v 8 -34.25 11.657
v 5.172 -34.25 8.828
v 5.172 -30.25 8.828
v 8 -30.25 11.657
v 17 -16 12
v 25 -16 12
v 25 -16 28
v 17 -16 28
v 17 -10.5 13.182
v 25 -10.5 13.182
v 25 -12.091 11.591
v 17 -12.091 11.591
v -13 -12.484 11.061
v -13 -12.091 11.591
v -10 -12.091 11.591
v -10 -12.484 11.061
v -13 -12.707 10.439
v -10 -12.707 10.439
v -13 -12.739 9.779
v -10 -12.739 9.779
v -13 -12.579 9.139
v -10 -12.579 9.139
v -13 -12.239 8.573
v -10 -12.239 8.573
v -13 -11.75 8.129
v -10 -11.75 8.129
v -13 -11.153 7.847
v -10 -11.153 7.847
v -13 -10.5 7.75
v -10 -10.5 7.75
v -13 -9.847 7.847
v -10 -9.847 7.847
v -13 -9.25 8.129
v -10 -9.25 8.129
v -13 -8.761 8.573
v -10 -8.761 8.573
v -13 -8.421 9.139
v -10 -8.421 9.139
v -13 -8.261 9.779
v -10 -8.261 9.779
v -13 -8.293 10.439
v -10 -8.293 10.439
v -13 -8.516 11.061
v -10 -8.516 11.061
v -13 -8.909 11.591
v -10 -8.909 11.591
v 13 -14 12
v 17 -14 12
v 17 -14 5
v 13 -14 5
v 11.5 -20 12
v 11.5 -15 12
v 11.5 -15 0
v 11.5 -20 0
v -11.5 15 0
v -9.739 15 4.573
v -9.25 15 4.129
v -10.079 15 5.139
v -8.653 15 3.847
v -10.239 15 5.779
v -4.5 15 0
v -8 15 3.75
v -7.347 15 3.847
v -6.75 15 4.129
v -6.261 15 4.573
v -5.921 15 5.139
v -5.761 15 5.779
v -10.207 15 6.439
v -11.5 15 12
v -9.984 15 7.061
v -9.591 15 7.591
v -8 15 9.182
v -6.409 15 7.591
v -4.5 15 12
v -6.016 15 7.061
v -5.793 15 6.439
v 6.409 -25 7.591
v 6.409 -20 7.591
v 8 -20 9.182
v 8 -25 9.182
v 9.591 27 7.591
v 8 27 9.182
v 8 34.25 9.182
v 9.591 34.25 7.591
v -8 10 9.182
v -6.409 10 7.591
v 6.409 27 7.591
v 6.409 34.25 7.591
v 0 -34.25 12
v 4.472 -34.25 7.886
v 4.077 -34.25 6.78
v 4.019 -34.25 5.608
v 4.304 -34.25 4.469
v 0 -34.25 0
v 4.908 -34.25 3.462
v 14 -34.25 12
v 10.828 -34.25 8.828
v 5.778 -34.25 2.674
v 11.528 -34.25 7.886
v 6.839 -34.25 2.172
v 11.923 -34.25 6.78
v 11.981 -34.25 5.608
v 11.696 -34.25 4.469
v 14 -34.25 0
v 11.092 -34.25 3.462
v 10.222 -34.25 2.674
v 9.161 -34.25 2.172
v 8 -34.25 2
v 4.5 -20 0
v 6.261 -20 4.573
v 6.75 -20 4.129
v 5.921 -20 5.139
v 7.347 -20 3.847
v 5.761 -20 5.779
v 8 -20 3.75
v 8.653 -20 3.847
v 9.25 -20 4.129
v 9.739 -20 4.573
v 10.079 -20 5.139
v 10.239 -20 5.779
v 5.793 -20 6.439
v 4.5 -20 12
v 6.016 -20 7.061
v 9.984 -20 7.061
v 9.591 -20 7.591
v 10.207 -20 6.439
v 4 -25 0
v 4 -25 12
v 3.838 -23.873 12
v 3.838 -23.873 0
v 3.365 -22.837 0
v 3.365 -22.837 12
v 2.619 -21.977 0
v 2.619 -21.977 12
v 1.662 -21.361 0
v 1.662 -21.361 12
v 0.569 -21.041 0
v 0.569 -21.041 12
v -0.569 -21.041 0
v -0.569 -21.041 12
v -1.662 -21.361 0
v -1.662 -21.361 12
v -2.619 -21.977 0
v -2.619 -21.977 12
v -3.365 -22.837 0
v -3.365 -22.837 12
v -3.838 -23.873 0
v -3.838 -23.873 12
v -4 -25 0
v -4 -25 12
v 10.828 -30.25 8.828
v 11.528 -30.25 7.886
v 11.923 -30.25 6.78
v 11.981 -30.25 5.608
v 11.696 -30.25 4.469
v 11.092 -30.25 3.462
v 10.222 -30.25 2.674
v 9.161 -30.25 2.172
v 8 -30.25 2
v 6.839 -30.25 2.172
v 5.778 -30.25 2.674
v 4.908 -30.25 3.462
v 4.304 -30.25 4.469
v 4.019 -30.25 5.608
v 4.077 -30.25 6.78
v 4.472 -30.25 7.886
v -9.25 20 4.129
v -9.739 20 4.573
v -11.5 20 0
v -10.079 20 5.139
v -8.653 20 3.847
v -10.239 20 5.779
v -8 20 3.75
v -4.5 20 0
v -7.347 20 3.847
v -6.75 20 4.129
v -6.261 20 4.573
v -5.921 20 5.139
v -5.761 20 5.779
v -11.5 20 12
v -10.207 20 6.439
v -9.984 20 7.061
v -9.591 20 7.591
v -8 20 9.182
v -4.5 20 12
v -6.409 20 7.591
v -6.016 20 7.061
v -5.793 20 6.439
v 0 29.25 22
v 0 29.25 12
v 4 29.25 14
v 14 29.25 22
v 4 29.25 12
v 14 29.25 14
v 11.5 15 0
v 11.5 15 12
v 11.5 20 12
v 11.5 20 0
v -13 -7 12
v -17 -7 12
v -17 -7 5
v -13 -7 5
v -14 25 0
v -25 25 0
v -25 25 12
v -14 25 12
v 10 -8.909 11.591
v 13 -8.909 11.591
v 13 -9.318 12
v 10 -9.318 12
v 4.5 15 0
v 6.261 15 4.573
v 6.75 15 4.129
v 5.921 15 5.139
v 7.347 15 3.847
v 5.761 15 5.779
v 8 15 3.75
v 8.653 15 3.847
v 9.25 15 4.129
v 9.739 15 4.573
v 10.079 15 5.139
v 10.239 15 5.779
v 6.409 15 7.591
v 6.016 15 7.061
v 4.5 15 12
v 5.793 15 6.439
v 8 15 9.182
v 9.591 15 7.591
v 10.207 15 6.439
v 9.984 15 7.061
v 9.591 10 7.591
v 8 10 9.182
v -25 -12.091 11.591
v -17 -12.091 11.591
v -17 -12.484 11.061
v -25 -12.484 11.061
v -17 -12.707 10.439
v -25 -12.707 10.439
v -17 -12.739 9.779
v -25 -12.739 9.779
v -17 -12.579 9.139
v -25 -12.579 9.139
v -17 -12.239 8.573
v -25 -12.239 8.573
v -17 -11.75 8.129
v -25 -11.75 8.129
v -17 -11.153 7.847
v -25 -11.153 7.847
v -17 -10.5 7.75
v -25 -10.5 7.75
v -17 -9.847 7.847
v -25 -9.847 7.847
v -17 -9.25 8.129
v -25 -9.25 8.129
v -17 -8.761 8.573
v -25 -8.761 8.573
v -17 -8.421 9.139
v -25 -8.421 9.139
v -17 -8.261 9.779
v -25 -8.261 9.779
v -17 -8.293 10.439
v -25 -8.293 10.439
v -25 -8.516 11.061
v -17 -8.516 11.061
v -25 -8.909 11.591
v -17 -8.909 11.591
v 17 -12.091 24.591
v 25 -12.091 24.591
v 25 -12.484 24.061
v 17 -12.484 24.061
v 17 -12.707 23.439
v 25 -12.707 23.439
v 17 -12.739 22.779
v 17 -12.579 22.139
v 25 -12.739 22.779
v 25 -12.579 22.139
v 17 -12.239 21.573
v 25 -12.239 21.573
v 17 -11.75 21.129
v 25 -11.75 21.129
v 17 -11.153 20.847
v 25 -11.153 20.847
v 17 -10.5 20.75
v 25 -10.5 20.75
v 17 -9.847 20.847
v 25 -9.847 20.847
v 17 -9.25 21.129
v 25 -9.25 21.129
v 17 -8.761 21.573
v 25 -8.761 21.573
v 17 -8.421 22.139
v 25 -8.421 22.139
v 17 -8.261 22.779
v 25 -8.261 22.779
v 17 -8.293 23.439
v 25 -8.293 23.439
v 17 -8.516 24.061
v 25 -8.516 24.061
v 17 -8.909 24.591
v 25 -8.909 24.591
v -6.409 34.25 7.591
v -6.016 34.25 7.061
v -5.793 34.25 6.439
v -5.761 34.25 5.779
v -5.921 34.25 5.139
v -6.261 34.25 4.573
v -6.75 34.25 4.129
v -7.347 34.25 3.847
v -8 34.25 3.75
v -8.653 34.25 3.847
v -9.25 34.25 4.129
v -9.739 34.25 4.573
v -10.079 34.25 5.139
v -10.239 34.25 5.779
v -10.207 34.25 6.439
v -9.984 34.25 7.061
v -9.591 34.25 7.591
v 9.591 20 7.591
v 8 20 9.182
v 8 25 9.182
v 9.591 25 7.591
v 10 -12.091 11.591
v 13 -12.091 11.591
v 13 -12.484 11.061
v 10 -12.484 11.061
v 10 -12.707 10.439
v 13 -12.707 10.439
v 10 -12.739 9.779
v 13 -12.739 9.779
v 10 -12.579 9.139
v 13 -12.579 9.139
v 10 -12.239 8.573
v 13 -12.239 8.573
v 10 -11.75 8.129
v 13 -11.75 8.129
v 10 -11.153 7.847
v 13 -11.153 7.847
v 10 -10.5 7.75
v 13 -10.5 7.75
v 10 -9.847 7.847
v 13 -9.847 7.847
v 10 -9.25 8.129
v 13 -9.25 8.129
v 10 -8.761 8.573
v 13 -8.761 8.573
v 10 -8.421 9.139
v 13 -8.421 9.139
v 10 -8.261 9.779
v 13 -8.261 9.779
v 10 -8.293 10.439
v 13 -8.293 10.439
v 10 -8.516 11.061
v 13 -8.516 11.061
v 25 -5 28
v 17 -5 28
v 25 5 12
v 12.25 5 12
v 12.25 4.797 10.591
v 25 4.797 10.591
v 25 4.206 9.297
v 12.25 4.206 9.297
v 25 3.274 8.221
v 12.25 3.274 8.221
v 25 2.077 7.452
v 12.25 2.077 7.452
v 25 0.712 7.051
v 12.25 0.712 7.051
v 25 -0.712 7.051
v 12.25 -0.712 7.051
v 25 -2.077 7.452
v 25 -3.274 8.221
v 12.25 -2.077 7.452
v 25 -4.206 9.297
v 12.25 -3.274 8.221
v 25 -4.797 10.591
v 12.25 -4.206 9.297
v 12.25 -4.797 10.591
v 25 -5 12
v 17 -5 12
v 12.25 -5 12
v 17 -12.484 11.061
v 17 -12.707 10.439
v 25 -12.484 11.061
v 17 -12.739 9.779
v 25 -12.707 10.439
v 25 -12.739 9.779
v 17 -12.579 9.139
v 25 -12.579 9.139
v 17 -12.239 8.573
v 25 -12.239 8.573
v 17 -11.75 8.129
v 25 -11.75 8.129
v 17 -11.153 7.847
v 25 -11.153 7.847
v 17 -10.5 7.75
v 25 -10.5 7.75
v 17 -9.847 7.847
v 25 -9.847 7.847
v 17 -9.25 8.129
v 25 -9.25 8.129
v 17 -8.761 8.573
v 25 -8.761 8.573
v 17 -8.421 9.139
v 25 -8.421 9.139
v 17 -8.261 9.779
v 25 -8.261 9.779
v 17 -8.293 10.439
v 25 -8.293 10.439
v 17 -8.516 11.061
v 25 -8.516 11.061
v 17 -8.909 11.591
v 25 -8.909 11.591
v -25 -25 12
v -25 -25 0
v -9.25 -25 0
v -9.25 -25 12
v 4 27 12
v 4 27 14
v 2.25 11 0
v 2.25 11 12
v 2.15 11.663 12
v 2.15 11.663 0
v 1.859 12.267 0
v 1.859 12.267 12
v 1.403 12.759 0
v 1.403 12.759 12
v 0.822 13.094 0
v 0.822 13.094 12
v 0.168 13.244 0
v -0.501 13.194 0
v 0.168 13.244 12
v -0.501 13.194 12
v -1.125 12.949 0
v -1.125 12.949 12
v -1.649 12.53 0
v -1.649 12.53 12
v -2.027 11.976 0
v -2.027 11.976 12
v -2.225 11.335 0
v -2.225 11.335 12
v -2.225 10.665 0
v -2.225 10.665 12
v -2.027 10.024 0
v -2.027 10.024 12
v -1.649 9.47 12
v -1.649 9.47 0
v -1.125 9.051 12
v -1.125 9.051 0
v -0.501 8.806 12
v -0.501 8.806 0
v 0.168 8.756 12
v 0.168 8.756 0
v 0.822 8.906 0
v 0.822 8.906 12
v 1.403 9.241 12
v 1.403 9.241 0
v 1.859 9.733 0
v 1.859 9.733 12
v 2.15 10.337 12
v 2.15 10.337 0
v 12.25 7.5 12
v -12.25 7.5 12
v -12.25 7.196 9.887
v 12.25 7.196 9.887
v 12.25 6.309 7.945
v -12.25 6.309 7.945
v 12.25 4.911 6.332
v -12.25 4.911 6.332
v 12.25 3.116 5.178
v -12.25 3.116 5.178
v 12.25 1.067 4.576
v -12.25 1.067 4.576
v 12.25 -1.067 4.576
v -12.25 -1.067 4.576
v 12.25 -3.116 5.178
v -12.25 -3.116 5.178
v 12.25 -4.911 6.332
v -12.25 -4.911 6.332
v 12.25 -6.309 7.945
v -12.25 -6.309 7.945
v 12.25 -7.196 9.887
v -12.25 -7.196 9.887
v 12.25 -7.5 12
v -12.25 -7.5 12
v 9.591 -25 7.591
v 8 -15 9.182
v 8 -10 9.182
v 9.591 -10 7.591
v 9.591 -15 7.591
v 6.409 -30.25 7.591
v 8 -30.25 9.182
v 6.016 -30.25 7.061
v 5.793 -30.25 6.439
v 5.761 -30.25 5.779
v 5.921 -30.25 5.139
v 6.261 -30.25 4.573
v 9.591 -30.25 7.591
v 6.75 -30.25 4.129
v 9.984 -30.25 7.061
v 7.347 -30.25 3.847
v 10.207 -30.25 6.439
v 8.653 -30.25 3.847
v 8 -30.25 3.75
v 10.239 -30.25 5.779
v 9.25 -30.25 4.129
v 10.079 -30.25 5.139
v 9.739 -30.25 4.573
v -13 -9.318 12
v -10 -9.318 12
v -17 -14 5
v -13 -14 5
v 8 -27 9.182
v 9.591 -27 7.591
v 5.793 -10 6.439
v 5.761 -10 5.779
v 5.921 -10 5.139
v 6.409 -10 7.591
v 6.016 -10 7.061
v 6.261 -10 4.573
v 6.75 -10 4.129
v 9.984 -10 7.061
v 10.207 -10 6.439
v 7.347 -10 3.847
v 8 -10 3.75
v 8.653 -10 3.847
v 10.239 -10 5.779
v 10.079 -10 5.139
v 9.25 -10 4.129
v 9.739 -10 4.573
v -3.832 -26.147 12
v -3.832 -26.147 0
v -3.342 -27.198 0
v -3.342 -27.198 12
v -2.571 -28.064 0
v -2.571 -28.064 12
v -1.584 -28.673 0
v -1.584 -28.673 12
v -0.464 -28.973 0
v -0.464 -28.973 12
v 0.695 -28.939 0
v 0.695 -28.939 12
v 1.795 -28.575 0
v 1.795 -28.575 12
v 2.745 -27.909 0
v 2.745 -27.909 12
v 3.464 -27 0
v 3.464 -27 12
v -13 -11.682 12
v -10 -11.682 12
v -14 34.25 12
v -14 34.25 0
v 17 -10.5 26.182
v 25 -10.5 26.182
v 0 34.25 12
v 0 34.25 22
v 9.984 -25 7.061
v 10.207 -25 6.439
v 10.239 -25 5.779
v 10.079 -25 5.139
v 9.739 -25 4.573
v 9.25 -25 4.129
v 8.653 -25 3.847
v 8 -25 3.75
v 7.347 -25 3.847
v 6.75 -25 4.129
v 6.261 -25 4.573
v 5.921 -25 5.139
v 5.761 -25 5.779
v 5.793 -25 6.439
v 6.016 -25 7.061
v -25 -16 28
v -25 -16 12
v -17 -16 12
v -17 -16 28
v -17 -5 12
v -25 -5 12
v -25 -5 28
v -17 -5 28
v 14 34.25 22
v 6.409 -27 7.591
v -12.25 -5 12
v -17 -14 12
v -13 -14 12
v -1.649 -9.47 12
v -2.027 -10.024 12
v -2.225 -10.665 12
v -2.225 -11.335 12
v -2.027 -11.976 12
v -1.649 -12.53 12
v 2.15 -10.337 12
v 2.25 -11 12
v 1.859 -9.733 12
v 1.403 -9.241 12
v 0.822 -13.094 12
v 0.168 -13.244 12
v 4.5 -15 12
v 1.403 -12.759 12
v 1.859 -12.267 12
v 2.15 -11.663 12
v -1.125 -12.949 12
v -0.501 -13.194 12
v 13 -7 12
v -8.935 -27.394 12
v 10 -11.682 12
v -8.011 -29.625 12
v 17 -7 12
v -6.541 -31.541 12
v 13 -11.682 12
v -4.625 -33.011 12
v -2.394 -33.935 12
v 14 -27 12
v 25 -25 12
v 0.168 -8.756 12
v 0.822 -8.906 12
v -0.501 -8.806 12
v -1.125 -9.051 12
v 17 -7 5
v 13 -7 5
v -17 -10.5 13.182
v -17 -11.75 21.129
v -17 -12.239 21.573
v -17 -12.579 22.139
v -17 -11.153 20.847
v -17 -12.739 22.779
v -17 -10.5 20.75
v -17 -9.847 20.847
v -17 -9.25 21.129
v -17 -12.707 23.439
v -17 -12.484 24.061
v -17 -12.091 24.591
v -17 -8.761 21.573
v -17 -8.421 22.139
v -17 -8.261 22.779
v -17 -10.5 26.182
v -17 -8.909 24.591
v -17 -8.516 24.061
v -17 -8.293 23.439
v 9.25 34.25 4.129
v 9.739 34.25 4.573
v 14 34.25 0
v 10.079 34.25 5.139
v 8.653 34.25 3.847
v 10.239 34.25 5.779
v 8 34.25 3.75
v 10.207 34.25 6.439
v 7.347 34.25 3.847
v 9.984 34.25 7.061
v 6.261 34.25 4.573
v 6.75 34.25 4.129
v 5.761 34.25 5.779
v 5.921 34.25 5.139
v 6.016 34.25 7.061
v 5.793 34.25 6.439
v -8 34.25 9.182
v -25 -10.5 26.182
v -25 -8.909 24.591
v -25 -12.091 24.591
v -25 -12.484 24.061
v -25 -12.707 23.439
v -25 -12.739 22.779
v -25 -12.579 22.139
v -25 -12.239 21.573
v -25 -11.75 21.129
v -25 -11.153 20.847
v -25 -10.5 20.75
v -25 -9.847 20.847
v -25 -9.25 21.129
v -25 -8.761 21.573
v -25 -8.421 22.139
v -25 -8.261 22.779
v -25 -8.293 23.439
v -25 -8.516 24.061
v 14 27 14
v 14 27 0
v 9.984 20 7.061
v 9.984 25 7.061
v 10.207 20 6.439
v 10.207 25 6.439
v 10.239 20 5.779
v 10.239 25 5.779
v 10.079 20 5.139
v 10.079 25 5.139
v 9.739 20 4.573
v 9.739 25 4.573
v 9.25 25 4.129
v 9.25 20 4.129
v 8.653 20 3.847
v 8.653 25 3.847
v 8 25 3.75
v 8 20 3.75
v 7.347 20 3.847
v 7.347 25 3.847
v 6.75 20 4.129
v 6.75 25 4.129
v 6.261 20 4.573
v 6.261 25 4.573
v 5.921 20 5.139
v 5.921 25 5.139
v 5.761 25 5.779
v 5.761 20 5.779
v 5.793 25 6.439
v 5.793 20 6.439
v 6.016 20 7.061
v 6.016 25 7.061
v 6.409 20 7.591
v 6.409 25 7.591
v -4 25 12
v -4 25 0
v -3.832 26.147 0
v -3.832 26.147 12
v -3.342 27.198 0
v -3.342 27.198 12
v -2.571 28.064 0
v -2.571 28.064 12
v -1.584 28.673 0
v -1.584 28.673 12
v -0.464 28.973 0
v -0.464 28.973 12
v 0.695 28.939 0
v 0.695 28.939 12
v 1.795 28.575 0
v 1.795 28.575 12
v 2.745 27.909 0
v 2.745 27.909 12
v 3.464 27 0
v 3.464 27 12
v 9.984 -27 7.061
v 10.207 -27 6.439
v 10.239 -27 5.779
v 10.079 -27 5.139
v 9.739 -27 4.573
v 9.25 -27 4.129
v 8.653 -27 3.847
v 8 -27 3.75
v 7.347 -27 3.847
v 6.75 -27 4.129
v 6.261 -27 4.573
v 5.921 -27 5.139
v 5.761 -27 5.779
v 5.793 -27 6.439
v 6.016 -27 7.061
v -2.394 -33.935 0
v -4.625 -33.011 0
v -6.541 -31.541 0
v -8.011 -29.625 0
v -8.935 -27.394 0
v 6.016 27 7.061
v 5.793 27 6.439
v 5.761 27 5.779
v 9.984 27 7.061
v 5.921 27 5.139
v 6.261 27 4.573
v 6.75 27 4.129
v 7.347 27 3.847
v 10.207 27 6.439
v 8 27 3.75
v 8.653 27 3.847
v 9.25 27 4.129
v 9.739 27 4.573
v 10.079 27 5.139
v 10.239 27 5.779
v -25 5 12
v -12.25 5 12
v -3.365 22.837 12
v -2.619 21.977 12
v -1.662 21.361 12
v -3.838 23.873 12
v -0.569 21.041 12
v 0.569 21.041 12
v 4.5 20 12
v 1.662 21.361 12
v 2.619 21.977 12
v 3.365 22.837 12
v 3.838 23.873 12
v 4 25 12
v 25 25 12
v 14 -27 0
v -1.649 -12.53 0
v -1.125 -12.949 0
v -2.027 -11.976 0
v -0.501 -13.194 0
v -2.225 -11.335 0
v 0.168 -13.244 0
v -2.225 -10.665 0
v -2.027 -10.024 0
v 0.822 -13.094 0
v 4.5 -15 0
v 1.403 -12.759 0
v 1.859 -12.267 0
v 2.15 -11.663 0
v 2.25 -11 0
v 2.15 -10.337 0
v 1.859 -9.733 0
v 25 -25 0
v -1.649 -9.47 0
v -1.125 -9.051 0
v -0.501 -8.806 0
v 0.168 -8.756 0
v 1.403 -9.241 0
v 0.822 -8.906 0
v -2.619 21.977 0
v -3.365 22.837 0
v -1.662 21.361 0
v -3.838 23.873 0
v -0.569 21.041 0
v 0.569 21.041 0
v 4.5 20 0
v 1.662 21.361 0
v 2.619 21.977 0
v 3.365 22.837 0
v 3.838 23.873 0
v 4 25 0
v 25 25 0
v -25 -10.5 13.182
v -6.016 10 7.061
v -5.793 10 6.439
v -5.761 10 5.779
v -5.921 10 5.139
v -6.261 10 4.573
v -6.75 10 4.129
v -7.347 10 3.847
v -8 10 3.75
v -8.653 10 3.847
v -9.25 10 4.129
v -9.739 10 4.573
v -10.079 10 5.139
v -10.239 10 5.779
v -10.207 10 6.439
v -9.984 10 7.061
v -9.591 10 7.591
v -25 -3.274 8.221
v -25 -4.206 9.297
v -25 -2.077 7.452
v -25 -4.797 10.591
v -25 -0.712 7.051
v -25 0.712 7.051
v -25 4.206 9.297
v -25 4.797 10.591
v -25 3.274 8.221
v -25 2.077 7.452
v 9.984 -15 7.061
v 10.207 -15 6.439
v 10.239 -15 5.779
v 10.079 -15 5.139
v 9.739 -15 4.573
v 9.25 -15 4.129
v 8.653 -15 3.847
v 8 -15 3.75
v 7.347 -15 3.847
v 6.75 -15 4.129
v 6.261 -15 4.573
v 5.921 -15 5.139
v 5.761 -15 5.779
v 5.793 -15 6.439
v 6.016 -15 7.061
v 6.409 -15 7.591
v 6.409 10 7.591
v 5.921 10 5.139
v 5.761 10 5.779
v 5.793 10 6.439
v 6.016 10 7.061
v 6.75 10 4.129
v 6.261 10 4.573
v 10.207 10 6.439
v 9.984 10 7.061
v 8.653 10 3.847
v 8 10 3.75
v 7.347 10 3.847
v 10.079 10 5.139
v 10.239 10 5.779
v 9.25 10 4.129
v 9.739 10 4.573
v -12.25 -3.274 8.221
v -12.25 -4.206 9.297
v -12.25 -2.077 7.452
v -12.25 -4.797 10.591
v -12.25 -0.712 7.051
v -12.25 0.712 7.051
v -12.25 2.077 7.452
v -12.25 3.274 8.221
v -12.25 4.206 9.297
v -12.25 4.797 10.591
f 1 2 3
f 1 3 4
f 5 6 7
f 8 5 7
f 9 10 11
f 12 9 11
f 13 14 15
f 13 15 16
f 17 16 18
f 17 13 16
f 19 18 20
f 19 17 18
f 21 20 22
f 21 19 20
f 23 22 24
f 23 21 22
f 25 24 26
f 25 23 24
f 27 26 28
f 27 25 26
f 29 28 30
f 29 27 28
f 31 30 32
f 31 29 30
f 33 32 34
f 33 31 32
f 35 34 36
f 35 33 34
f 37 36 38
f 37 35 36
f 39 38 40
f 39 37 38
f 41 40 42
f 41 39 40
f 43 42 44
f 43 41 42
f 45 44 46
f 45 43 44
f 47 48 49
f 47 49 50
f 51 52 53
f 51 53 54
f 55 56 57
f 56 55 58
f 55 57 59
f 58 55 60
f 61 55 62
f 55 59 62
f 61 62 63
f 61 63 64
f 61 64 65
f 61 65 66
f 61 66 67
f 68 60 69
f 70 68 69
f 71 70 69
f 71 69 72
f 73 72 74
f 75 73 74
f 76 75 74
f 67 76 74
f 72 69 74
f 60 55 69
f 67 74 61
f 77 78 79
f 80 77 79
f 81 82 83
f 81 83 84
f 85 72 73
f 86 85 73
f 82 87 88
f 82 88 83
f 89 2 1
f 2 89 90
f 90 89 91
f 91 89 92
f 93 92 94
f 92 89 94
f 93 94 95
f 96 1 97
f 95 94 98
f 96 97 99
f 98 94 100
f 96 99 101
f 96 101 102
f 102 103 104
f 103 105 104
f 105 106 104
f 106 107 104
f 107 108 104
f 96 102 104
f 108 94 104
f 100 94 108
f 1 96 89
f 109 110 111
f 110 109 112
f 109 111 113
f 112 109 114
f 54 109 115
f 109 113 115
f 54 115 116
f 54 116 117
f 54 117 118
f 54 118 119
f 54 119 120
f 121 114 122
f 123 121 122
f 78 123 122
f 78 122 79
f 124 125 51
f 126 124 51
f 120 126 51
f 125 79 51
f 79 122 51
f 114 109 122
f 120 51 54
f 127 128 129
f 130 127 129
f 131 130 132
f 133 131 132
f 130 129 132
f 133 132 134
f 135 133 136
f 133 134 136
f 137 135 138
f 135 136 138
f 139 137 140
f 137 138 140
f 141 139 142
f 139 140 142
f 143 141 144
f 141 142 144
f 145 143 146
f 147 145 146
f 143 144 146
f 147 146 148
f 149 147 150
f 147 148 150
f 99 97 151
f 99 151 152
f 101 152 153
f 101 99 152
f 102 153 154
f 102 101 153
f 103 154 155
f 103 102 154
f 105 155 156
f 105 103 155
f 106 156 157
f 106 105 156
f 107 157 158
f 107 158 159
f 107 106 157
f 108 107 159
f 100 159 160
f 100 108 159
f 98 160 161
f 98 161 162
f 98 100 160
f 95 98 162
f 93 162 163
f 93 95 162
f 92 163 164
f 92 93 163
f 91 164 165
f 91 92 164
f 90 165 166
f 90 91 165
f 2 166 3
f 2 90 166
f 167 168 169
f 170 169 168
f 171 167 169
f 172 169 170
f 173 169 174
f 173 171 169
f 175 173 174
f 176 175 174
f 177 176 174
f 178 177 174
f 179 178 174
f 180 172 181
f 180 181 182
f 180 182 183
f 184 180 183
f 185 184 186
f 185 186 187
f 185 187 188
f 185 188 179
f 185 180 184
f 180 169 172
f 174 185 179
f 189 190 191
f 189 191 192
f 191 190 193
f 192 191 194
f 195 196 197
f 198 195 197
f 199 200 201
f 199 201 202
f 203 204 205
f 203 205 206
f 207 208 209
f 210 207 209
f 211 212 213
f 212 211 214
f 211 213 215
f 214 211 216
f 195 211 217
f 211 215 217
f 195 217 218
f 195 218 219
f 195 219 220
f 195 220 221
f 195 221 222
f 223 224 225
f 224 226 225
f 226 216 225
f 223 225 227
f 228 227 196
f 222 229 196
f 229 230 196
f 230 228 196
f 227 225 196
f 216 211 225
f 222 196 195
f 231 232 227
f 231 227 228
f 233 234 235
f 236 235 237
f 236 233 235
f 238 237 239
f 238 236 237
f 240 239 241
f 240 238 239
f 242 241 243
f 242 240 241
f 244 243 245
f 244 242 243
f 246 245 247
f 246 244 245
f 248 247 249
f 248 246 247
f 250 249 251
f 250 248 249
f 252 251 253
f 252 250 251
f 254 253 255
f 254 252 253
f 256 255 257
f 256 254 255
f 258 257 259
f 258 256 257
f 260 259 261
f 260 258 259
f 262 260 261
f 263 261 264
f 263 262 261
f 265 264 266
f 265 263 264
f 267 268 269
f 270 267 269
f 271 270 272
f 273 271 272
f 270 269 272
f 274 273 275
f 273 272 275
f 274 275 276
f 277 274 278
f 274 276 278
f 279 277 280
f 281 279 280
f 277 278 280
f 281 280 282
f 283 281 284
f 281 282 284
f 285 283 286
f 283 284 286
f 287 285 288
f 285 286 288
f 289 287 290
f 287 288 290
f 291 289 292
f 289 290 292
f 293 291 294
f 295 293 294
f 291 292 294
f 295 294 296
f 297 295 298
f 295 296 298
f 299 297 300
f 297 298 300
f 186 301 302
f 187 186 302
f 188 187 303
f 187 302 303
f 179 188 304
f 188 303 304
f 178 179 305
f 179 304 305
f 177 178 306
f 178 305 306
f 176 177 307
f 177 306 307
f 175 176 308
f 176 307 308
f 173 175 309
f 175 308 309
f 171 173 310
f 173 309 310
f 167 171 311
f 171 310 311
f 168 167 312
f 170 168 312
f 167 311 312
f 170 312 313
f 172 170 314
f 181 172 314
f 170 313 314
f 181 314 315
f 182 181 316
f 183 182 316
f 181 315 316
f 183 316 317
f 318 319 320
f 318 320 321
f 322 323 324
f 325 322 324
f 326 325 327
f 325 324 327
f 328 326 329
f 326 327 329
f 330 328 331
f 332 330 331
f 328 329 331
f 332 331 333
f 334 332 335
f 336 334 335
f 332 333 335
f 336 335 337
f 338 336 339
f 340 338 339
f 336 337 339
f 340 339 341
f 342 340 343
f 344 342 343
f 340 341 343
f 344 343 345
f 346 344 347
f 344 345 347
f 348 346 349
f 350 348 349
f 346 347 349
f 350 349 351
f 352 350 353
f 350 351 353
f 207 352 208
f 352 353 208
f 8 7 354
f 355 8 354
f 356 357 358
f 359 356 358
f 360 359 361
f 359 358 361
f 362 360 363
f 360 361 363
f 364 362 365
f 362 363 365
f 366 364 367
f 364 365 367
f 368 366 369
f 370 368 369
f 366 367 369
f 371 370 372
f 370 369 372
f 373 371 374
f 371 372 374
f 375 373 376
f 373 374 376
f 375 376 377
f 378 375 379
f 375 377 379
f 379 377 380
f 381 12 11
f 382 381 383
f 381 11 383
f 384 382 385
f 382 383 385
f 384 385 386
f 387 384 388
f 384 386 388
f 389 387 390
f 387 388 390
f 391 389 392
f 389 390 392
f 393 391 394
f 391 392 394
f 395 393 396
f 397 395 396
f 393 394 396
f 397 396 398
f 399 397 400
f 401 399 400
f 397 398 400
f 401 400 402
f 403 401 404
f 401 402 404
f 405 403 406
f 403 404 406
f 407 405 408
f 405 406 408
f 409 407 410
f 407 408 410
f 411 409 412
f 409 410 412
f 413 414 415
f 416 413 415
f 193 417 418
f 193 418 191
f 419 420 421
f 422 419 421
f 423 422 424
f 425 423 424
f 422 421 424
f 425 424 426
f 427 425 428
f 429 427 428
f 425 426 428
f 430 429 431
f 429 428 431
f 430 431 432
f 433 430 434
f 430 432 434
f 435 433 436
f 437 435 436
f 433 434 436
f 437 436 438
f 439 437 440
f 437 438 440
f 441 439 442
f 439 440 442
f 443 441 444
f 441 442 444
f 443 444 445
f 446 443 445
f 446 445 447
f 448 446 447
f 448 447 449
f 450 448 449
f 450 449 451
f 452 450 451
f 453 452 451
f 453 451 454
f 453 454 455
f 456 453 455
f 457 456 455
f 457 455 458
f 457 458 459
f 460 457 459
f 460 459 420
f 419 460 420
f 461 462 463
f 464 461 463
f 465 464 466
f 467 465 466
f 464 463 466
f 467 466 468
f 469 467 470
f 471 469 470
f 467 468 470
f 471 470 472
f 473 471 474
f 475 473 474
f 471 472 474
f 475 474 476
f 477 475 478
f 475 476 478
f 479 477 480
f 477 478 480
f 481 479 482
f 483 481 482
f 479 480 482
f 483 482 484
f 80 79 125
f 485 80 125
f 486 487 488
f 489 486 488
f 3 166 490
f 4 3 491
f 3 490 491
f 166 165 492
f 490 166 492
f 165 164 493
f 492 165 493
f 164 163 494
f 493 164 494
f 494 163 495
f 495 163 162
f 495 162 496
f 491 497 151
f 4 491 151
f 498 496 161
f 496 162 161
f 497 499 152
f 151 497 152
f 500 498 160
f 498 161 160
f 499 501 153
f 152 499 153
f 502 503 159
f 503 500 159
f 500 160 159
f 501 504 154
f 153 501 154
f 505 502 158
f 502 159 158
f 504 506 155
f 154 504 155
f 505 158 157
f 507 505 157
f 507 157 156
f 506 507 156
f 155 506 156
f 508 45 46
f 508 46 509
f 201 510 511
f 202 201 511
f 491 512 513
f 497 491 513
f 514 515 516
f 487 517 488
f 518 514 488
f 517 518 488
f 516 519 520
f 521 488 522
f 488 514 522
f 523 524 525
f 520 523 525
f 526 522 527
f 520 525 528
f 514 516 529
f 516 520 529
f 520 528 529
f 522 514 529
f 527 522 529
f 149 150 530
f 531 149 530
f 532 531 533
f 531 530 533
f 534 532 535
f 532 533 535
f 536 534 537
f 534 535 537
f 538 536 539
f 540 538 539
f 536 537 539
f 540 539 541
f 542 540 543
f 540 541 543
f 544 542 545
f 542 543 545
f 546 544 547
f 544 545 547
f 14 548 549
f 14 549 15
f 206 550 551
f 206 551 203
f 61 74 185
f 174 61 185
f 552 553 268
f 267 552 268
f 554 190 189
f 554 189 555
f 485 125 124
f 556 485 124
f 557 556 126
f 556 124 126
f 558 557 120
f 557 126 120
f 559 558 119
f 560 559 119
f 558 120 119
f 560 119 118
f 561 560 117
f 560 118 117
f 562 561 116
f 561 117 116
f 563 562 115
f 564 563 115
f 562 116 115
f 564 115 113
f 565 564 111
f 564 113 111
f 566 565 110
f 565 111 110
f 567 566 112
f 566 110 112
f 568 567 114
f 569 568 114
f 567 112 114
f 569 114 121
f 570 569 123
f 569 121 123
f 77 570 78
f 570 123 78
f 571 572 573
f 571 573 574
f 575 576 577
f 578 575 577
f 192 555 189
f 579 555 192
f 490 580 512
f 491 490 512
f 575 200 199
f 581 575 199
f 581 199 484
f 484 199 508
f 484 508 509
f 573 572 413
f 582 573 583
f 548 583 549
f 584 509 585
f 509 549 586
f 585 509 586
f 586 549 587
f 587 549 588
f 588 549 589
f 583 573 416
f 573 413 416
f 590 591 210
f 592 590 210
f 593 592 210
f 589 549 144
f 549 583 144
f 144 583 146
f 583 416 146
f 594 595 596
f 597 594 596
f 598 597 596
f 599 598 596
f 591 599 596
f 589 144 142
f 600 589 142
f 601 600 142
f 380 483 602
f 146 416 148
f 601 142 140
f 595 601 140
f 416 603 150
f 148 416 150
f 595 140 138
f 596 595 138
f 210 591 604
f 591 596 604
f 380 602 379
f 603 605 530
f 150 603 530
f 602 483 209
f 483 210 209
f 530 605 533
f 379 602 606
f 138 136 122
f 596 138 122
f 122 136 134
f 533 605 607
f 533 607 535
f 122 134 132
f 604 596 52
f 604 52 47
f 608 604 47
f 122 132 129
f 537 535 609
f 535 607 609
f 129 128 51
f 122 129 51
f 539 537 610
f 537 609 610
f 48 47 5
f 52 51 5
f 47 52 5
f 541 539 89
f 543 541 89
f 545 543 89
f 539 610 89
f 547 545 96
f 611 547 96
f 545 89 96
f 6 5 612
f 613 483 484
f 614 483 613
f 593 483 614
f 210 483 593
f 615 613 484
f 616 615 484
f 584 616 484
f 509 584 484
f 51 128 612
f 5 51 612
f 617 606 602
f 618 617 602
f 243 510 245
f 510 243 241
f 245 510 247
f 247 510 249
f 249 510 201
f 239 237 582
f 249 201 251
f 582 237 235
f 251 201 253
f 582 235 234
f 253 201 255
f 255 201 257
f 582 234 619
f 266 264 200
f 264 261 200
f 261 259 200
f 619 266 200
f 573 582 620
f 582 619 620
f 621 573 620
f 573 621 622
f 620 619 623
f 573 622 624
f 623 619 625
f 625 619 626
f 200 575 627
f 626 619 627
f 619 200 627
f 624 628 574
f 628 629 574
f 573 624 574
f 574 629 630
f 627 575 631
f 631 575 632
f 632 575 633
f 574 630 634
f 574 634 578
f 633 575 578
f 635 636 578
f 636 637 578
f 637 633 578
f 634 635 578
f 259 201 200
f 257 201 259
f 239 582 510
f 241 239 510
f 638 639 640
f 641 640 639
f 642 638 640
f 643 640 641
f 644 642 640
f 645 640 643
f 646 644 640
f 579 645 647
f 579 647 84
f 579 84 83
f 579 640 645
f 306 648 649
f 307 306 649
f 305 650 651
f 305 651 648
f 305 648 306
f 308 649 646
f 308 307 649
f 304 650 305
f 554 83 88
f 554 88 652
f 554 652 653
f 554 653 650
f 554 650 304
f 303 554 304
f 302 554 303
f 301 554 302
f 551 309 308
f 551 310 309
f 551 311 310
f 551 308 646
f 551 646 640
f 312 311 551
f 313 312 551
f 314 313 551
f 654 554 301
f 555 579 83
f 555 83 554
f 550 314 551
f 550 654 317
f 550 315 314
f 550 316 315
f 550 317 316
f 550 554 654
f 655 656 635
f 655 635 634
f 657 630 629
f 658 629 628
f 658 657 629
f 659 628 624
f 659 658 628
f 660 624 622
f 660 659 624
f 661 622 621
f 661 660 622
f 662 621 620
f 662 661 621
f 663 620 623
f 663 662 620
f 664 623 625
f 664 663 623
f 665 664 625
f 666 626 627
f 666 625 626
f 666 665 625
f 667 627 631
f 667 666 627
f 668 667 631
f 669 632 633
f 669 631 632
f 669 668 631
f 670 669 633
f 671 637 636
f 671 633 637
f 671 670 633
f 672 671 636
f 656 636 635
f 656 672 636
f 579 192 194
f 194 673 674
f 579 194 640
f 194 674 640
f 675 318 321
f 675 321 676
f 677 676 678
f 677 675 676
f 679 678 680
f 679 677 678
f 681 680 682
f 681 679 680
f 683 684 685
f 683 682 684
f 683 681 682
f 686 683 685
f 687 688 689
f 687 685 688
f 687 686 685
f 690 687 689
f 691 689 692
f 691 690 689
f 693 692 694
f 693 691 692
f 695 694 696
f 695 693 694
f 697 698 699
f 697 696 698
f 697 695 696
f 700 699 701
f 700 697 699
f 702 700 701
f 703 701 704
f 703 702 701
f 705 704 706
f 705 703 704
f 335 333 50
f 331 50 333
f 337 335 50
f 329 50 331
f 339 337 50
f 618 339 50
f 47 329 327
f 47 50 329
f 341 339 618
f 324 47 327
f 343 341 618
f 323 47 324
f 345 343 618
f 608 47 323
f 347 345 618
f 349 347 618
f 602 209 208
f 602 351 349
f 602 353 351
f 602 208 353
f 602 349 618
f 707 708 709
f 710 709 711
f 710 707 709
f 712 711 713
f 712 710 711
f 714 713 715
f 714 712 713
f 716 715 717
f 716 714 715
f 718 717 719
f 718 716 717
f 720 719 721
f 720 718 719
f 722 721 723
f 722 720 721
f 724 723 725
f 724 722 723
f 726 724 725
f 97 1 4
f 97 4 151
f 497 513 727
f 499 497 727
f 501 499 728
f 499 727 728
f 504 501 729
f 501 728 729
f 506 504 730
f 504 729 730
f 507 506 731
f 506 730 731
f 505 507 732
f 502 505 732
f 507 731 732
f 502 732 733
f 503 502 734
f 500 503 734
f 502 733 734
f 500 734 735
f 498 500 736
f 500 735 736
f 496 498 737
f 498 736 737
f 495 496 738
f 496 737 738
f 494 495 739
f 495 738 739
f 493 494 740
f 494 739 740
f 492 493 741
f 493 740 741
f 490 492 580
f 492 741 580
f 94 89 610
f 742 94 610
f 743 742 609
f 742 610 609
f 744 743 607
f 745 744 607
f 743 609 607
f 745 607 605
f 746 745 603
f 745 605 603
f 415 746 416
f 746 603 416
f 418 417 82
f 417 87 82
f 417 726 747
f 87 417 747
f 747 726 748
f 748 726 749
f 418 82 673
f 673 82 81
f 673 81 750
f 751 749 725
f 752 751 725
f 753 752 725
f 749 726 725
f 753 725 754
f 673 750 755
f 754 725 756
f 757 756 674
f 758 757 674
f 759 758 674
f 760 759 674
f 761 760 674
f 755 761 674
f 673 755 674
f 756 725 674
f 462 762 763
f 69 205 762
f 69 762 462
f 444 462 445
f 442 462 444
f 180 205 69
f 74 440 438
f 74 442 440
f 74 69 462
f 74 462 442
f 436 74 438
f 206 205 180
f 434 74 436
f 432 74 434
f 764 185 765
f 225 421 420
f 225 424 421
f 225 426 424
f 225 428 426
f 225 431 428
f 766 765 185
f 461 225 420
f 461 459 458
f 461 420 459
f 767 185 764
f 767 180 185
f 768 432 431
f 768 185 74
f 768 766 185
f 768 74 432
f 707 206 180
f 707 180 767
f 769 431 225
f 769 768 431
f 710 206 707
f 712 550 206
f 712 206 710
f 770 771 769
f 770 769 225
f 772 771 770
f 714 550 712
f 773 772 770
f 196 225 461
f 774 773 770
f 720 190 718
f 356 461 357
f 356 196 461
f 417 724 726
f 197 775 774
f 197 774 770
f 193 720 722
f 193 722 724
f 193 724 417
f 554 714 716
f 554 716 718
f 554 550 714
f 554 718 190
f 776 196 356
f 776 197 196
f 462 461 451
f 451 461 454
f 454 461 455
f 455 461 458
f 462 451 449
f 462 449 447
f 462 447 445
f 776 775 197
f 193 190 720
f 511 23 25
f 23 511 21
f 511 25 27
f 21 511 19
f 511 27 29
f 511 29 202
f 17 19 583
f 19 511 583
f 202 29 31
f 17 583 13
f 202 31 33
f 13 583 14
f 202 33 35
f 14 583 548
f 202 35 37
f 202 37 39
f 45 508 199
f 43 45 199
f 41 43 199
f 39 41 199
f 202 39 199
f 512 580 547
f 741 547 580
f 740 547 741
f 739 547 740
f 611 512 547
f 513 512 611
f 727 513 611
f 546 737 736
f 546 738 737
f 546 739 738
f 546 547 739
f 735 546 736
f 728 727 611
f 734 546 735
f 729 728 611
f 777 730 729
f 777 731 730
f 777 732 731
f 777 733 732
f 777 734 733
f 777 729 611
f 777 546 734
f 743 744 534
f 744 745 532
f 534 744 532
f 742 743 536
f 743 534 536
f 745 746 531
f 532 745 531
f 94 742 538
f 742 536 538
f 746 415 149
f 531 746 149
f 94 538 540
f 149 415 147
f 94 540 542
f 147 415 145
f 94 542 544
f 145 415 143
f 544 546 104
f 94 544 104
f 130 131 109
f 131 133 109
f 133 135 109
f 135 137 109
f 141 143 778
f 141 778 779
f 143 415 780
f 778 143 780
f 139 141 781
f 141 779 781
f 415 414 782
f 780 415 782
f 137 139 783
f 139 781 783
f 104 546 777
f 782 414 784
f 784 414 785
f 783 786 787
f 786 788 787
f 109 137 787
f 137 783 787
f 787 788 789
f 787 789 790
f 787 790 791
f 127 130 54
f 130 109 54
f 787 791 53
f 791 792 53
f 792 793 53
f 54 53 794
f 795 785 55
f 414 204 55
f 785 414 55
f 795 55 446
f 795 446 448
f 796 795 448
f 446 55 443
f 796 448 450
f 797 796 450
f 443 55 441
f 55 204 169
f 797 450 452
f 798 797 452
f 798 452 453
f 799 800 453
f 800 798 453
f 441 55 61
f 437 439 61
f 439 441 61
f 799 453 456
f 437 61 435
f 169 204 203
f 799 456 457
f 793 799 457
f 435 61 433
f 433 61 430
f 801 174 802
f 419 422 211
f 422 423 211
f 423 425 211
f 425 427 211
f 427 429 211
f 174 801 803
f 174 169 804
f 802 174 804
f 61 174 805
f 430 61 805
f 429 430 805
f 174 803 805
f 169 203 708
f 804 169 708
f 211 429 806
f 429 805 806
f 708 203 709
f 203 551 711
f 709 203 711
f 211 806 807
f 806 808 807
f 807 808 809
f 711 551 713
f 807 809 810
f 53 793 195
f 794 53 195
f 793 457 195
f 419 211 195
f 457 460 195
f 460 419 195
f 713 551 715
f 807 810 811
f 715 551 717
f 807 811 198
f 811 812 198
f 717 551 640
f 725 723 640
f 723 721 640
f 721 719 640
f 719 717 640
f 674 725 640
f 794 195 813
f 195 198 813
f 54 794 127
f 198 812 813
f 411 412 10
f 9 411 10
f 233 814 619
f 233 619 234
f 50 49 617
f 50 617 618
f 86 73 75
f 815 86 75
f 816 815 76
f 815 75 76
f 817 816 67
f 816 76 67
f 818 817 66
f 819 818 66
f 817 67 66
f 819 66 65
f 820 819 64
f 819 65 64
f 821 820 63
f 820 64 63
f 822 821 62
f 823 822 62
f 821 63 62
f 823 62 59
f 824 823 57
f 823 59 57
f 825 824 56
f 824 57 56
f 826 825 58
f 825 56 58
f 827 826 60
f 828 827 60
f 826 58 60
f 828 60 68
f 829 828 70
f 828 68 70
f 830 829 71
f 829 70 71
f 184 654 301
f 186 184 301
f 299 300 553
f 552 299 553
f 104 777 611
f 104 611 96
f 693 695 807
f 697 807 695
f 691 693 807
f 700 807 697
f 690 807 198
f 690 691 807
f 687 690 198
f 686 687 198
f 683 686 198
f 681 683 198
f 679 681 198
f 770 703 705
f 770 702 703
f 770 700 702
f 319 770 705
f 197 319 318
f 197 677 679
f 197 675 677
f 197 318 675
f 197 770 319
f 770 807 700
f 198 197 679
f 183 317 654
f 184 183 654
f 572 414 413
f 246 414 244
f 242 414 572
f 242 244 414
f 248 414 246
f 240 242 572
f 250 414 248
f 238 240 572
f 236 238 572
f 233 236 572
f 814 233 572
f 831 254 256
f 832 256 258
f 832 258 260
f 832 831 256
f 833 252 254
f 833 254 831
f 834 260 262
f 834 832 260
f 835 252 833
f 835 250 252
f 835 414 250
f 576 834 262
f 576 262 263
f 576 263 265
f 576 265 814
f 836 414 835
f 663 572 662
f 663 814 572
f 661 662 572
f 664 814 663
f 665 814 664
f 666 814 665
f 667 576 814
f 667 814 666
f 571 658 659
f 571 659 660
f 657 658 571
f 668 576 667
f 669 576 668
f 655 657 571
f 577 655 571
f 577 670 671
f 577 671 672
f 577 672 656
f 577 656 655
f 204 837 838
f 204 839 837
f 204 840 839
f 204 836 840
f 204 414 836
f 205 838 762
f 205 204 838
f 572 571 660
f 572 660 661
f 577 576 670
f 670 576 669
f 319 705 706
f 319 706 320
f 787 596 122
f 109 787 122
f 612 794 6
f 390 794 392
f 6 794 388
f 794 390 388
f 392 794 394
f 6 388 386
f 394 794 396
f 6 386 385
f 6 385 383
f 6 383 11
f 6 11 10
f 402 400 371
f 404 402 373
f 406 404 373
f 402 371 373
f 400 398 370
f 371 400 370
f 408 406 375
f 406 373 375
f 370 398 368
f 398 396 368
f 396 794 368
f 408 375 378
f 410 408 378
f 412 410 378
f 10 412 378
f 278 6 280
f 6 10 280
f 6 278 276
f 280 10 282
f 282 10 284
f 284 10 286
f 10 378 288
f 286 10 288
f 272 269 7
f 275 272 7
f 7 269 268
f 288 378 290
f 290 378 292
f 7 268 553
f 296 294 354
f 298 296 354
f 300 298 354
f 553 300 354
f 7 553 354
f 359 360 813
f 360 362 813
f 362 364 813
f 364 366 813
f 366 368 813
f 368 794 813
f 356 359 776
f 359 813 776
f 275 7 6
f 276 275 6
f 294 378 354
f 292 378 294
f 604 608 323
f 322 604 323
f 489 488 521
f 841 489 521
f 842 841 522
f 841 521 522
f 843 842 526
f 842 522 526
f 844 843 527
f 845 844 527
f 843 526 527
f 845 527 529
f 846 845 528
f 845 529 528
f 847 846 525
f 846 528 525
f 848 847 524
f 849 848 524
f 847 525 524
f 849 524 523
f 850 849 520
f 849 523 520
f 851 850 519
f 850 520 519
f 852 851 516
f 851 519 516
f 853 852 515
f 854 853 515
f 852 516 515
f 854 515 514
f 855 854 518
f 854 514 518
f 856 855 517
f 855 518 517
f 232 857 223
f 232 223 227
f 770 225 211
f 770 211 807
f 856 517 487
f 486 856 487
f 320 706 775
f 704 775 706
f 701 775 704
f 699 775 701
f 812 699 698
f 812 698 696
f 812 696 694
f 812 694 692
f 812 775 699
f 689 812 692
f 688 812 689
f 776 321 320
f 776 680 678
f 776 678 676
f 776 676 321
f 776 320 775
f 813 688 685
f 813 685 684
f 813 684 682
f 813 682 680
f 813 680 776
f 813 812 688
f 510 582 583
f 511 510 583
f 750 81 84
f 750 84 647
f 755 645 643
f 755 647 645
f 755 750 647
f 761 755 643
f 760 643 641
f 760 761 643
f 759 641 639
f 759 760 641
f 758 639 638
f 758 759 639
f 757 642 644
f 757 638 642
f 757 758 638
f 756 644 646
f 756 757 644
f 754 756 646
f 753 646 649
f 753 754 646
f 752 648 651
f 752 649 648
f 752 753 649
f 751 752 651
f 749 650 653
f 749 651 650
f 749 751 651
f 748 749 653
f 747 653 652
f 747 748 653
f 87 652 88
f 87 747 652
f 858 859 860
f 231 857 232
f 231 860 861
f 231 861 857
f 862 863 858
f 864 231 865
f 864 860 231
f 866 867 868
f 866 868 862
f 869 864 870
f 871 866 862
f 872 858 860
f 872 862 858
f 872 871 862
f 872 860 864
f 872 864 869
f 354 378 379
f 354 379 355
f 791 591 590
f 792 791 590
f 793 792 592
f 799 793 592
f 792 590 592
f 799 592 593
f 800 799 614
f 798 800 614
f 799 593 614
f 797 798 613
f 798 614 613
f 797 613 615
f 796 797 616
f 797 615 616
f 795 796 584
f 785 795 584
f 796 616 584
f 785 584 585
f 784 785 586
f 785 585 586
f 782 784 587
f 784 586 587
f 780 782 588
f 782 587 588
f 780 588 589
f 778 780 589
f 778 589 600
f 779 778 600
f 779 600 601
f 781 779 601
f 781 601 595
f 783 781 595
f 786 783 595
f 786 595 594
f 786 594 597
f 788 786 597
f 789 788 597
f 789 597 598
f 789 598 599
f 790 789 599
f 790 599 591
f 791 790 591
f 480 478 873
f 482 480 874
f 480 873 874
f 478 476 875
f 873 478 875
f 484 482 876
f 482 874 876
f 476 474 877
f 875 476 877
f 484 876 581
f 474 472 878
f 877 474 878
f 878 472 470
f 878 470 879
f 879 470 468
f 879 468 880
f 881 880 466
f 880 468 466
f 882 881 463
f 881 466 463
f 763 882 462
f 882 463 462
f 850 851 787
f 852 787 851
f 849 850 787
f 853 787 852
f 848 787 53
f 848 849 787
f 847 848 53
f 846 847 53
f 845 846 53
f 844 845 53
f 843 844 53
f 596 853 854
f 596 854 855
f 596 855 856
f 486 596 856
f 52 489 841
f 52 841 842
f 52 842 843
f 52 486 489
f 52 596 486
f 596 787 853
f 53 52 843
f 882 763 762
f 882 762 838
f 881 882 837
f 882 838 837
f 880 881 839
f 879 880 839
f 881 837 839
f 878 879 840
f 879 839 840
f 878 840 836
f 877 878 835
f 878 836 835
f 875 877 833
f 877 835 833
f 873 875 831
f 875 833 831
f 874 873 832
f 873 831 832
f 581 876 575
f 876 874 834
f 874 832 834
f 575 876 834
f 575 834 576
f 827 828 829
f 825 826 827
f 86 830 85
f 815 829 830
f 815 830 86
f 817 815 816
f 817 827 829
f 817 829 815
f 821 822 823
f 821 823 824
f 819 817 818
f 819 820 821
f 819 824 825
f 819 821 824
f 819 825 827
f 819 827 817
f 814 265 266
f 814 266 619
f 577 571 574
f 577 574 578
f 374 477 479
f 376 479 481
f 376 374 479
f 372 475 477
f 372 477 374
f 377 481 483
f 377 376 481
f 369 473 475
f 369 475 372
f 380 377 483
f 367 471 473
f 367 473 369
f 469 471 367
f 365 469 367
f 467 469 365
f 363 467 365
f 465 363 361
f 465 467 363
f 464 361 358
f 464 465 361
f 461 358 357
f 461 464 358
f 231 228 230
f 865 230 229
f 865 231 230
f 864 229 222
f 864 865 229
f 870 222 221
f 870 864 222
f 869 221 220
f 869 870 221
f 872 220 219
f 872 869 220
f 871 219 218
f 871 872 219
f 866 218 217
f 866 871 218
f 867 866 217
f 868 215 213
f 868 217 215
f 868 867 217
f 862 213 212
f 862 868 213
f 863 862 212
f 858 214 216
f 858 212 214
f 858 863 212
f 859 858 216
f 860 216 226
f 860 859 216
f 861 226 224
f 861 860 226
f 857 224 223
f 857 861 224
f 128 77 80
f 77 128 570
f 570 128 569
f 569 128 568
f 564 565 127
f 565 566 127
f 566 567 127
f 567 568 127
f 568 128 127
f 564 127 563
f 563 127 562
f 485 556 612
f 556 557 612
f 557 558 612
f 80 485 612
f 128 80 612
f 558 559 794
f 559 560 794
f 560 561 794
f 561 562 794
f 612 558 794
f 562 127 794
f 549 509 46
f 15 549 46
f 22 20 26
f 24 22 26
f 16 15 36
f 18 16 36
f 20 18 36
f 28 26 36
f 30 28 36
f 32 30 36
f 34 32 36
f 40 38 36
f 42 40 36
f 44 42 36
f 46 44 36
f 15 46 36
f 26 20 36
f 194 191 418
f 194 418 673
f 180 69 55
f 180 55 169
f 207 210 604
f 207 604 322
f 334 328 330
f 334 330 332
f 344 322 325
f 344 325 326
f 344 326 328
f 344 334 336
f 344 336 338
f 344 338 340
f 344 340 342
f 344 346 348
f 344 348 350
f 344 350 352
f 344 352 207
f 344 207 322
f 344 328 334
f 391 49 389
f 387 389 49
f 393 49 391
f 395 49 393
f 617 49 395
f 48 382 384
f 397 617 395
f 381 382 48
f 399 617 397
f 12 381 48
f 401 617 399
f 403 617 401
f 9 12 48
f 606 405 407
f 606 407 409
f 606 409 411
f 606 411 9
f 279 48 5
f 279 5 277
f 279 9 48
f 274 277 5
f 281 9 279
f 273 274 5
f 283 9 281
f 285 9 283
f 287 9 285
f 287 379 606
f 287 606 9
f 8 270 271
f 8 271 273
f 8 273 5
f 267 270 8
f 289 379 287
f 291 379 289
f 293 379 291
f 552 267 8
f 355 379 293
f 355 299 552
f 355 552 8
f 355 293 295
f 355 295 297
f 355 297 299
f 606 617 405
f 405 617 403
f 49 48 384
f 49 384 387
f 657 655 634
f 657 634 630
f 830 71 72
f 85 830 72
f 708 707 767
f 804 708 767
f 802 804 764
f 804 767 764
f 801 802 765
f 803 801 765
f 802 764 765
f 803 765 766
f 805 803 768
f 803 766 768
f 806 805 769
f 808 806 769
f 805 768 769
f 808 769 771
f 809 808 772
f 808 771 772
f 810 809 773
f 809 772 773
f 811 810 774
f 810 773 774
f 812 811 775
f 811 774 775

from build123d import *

# Parameters (mm, degrees)
SKETCH1_W           = 50
SKETCH1_H           = 50
BOSS_EXTRUDE1_DEPTH = 12
SKETCH2_R           = 5
CUT_EXTRUDE1_DEPTH  = 58.175169436
CUT_EXTRUDE2_START  = -12.75
SKETCH3_R           = 7.5
CUT_EXTRUDE2_DEPTH  = 24.5
SKETCH4_R           = 2.25
CUT_EXTRUDE3_DEPTH  = 38.336309405
SKETCH5_R           = 4
CUT_EXTRUDE4_DEPTH  = 38.336309405
BOSS_EXTRUDE3_DEPTH = 12
CUT_EXTRUDE5_START  = -15
CUT_EXTRUDE5_DEPTH  = 73.175169436
SKETCH7_W           = 7
SKETCH7_H           = 5
CUT_EXTRUDE6_DEPTH  = 45.068838197
SKETCH13_W          = 10
SKETCH13_H          = 7.25
BOSS_EXTRUDE4_DEPTH = 2
SKETCH14_W          = 14
SKETCH14_H          = 5
BOSS_EXTRUDE5_DEPTH = 10
SKETCH8_W           = 16
SKETCH8_H           = 11
BOSS_EXTRUDE2_DEPTH = 8
CUT_EXTRUDE7_DEPTH  = 15
SKETCH10_W          = 4
SKETCH10_H          = 7
CUT_EXTRUDE8_DEPTH  = 7
CUT_EXTRUDE9_DEPTH  = 4
SKETCH15_W          = 7
SKETCH15_H          = 5
CUT_EXTRUDE10_DEPTH = 46.321766294
BOSS_EXTRUDE6_DEPTH = 12
CUT_EXTRUDE11_REACH = 80.11
SKETCH18_W          = 10
SKETCH18_H          = 18.25
CUT_EXTRUDE12_DEPTH = 59.975100678


with BuildPart() as part:
    # Sketch1 → Boss-Extrude1 (new body)
    with BuildSketch(Plane.XY):
        Rectangle(SKETCH1_W, SKETCH1_H)
    extrude(amount=BOSS_EXTRUDE1_DEPTH)

    # Sketch2 → Cut-Extrude1 (cut, through all)
    with BuildSketch(Plane.ZY.offset(25)):
        with Locations((12, 0)):
            Circle(SKETCH2_R)
    extrude(amount=-CUT_EXTRUDE1_DEPTH, mode=Mode.SUBTRACT)

    # Sketch3 → Cut-Extrude2 (cut)
    with BuildSketch(Plane.ZY.offset(25).offset(CUT_EXTRUDE2_START)):
        with Locations((12, 0)):
            Circle(SKETCH3_R)
    extrude(amount=-CUT_EXTRUDE2_DEPTH, mode=Mode.SUBTRACT)

    # Sketch4 → Cut-Extrude3 (cut, through all)
    with BuildSketch(Plane.XY.offset(12)):
        with Locations((0, 11)):
            Circle(SKETCH4_R)
        with Locations((0, -11)):
            Circle(SKETCH4_R)
    extrude(amount=-CUT_EXTRUDE3_DEPTH, mode=Mode.SUBTRACT)

    # Sketch5 → Cut-Extrude4 (cut, through all)
    with BuildSketch(Plane.XY.offset(12)):
        with Locations((0, 25)):
            Circle(SKETCH5_R)
        with Locations((0, -25)):
            Circle(SKETCH5_R)
    extrude(amount=-CUT_EXTRUDE4_DEPTH, mode=Mode.SUBTRACT)

    # Sketch11 → Boss-Extrude3 (add)
    with BuildSketch(Plane.XY.offset(12)):
        with BuildLine():
            Line((3.464101615, 27), (14, 27))
            Line((14, 27), (14, 34.25))
            Line((14, 34.25), (0, 34.25))
            ThreePointArc((0, 34.25), (-6.540737726, 31.540737726), (-9.25, 25))
            Line((-9.25, 25), (-4, 25))
            ThreePointArc((-4, 25), (-1.03527618, 28.863703305), (3.464101615, 27))
        make_face()
    boss_extrude3 = extrude(amount=-BOSS_EXTRUDE3_DEPTH)

    # Sketch6 → Cut-Extrude5 (cut)
    with BuildSketch(Plane(origin=(0, 25, 0), x_dir=(1, 0, 0), z_dir=(0, 1, 0)).offset(CUT_EXTRUDE5_START)):
        with BuildLine():
            Line((6.409009742, -7.590990258), (8, -9.181980515))
            Line((8, -9.181980515), (9.590990258, -7.590990258))
            ThreePointArc((9.590990258, -7.590990258), (8, -3.75), (6.409009742, -7.590990258))
        make_face()
    cut_extrude5 = extrude(amount=CUT_EXTRUDE5_DEPTH, mode=Mode.SUBTRACT)

    # Sketch7 → Cut-Extrude6 (cut, through all)
    with BuildSketch(Plane.XY.offset(12)):
        with Locations((8, 17.5)):
            Rectangle(SKETCH7_W, SKETCH7_H)
    cut_extrude6 = extrude(amount=-CUT_EXTRUDE6_DEPTH, mode=Mode.SUBTRACT)

    # Sketch13 → Boss-Extrude4 (add)
    with BuildSketch(Plane.XY.offset(12)):
        with Locations((9, 30.625)):
            Rectangle(SKETCH13_W, SKETCH13_H)
    boss_extrude4 = extrude(amount=BOSS_EXTRUDE4_DEPTH)

    # Sketch14 → Boss-Extrude5 (add)
    with BuildSketch(Plane.XY.offset(12)):
        with Locations((7, 31.75)):
            Rectangle(SKETCH14_W, SKETCH14_H)
    boss_extrude5 = extrude(amount=BOSS_EXTRUDE5_DEPTH)

    # Mirror1: Boss-Extrude3, Cut-Extrude5, Cut-Extrude6, Boss-Extrude4, Boss-Extrude5 across plane
    add(boss_extrude3.mirror(Plane.ZX))
    add(cut_extrude5.mirror(Plane.ZX), mode=Mode.SUBTRACT)
    add(cut_extrude6.mirror(Plane.ZX), mode=Mode.SUBTRACT)
    add(boss_extrude4.mirror(Plane.ZX))
    add(boss_extrude5.mirror(Plane.ZX))

    # Sketch8 → Boss-Extrude2 (add)
    with BuildSketch(Plane.ZY.offset(25)):
        with Locations((20, -10.5)):
            Rectangle(SKETCH8_W, SKETCH8_H)
    boss_extrude2 = extrude(amount=-BOSS_EXTRUDE2_DEPTH)

    # Sketch9 → Cut-Extrude7 (cut)
    with BuildSketch(Plane.ZY.offset(25)):
        with BuildLine():
            Line((11.590990258, -8.909009742), (13.181980515, -10.5))
            Line((13.181980515, -10.5), (11.590990258, -12.090990258))
            ThreePointArc((11.590990258, -12.090990258), (7.75, -10.5), (11.590990258, -8.909009742))
        make_face()
        with BuildLine():
            Line((24.590990258, -8.909009742), (26.181980515, -10.5))
            Line((26.181980515, -10.5), (24.590990258, -12.090990258))
            ThreePointArc((24.590990258, -12.090990258), (20.75, -10.5), (24.590990258, -8.909009742))
        make_face()
    cut_extrude7 = extrude(amount=-CUT_EXTRUDE7_DEPTH, mode=Mode.SUBTRACT)

    # Sketch10 → Cut-Extrude8 (cut)
    with BuildSketch(Plane.XY.offset(12)):
        with Locations((-15, -10.5)):
            Rectangle(SKETCH10_W, SKETCH10_H)
    cut_extrude8 = extrude(amount=-CUT_EXTRUDE8_DEPTH, mode=Mode.SUBTRACT)

    # Mirror2: Boss-Extrude2, Cut-Extrude7, Cut-Extrude8 across plane
    add(boss_extrude2.mirror(Plane(origin=(0, 0, 0), x_dir=(0, 0, 1), z_dir=(1, 0, 0))))
    add(cut_extrude7.mirror(Plane(origin=(0, 0, 0), x_dir=(0, 0, 1), z_dir=(1, 0, 0))), mode=Mode.SUBTRACT)
    add(cut_extrude8.mirror(Plane(origin=(0, 0, 0), x_dir=(0, 0, 1), z_dir=(1, 0, 0))), mode=Mode.SUBTRACT)

    # Sketch12 → Cut-Extrude9 (cut)
    with BuildSketch(Plane(origin=(0, -34.25, 0), x_dir=(1, 0, 0), z_dir=(0, 1, 0))):
        with BuildLine():
            Line((5.171572875, -8.828427125), (8, -11.656854249))
            Line((8, -11.656854249), (10.828427125, -8.828427125))
            ThreePointArc((10.828427125, -8.828427125), (8, -2), (5.171572875, -8.828427125))
        make_face()
    extrude(amount=CUT_EXTRUDE9_DEPTH, mode=Mode.SUBTRACT)

    # Sketch15 → Cut-Extrude10 (cut, through all)
    with BuildSketch(Plane.XY.offset(12)):
        with Locations((-8, 17.5)):
            Rectangle(SKETCH15_W, SKETCH15_H)
    extrude(amount=-CUT_EXTRUDE10_DEPTH, mode=Mode.SUBTRACT)

    # Sketch16 → Boss-Extrude6 (add)
    with BuildSketch(Plane.XY.offset(12)):
        with BuildLine():
            Line((-14, 25), (-4, 25))
            ThreePointArc((-4, 25), (-2.828427125, 27.828427125), (0, 29))
            Line((0, 29), (0, 34.25))
            Line((0, 34.25), (-14, 34.25))
            Line((-14, 34.25), (-14, 25))
        make_face()
    extrude(amount=-BOSS_EXTRUDE6_DEPTH)

    # Cut-Extrude11: up to this face of the body (flat: up to its plane)
    cut_extrude11_end = Plane(part.part.faces().sort_by_distance((8, 10, 6.158015302))[0])
    # Sketch17 → Cut-Extrude11 (cut, up to the picked face)
    with BuildSketch(Plane(origin=(0, 34.25, 0), x_dir=(1, 0, 0), z_dir=(0, 1, 0)), mode=Mode.PRIVATE) as cut_extrude11_sk1:
        with BuildLine():
            Line((-9.590990258, -7.590990258), (-8, -9.181980515))
            Line((-8, -9.181980515), (-6.409009742, -7.590990258))
            ThreePointArc((-6.409009742, -7.590990258), (-8, -3.75), (-9.590990258, -7.590990258))
        make_face()
    cut_extrude11_tool1 = split(extrude(cut_extrude11_sk1.sketch, amount=-CUT_EXTRUDE11_REACH, mode=Mode.PRIVATE), bisect_by=cut_extrude11_end, keep=Keep.BOTH, mode=Mode.PRIVATE)
    add(cut_extrude11_tool1.solids().sort_by(Axis((-8, 34.25, 6.158015), (0, -1, 0)))[0], mode=Mode.SUBTRACT)

    # Sketch18 → Cut-Extrude12 (cut, through all)
    with BuildSketch(Plane(origin=(14, 0, 0), x_dir=(0, 0, -1), z_dir=(1, 0, 0))):
        with Locations((-17, -25.125)):
            Rectangle(SKETCH18_W, SKETCH18_H)
    extrude(amount=-CUT_EXTRUDE12_DEPTH, mode=Mode.SUBTRACT)


solid = part.part
